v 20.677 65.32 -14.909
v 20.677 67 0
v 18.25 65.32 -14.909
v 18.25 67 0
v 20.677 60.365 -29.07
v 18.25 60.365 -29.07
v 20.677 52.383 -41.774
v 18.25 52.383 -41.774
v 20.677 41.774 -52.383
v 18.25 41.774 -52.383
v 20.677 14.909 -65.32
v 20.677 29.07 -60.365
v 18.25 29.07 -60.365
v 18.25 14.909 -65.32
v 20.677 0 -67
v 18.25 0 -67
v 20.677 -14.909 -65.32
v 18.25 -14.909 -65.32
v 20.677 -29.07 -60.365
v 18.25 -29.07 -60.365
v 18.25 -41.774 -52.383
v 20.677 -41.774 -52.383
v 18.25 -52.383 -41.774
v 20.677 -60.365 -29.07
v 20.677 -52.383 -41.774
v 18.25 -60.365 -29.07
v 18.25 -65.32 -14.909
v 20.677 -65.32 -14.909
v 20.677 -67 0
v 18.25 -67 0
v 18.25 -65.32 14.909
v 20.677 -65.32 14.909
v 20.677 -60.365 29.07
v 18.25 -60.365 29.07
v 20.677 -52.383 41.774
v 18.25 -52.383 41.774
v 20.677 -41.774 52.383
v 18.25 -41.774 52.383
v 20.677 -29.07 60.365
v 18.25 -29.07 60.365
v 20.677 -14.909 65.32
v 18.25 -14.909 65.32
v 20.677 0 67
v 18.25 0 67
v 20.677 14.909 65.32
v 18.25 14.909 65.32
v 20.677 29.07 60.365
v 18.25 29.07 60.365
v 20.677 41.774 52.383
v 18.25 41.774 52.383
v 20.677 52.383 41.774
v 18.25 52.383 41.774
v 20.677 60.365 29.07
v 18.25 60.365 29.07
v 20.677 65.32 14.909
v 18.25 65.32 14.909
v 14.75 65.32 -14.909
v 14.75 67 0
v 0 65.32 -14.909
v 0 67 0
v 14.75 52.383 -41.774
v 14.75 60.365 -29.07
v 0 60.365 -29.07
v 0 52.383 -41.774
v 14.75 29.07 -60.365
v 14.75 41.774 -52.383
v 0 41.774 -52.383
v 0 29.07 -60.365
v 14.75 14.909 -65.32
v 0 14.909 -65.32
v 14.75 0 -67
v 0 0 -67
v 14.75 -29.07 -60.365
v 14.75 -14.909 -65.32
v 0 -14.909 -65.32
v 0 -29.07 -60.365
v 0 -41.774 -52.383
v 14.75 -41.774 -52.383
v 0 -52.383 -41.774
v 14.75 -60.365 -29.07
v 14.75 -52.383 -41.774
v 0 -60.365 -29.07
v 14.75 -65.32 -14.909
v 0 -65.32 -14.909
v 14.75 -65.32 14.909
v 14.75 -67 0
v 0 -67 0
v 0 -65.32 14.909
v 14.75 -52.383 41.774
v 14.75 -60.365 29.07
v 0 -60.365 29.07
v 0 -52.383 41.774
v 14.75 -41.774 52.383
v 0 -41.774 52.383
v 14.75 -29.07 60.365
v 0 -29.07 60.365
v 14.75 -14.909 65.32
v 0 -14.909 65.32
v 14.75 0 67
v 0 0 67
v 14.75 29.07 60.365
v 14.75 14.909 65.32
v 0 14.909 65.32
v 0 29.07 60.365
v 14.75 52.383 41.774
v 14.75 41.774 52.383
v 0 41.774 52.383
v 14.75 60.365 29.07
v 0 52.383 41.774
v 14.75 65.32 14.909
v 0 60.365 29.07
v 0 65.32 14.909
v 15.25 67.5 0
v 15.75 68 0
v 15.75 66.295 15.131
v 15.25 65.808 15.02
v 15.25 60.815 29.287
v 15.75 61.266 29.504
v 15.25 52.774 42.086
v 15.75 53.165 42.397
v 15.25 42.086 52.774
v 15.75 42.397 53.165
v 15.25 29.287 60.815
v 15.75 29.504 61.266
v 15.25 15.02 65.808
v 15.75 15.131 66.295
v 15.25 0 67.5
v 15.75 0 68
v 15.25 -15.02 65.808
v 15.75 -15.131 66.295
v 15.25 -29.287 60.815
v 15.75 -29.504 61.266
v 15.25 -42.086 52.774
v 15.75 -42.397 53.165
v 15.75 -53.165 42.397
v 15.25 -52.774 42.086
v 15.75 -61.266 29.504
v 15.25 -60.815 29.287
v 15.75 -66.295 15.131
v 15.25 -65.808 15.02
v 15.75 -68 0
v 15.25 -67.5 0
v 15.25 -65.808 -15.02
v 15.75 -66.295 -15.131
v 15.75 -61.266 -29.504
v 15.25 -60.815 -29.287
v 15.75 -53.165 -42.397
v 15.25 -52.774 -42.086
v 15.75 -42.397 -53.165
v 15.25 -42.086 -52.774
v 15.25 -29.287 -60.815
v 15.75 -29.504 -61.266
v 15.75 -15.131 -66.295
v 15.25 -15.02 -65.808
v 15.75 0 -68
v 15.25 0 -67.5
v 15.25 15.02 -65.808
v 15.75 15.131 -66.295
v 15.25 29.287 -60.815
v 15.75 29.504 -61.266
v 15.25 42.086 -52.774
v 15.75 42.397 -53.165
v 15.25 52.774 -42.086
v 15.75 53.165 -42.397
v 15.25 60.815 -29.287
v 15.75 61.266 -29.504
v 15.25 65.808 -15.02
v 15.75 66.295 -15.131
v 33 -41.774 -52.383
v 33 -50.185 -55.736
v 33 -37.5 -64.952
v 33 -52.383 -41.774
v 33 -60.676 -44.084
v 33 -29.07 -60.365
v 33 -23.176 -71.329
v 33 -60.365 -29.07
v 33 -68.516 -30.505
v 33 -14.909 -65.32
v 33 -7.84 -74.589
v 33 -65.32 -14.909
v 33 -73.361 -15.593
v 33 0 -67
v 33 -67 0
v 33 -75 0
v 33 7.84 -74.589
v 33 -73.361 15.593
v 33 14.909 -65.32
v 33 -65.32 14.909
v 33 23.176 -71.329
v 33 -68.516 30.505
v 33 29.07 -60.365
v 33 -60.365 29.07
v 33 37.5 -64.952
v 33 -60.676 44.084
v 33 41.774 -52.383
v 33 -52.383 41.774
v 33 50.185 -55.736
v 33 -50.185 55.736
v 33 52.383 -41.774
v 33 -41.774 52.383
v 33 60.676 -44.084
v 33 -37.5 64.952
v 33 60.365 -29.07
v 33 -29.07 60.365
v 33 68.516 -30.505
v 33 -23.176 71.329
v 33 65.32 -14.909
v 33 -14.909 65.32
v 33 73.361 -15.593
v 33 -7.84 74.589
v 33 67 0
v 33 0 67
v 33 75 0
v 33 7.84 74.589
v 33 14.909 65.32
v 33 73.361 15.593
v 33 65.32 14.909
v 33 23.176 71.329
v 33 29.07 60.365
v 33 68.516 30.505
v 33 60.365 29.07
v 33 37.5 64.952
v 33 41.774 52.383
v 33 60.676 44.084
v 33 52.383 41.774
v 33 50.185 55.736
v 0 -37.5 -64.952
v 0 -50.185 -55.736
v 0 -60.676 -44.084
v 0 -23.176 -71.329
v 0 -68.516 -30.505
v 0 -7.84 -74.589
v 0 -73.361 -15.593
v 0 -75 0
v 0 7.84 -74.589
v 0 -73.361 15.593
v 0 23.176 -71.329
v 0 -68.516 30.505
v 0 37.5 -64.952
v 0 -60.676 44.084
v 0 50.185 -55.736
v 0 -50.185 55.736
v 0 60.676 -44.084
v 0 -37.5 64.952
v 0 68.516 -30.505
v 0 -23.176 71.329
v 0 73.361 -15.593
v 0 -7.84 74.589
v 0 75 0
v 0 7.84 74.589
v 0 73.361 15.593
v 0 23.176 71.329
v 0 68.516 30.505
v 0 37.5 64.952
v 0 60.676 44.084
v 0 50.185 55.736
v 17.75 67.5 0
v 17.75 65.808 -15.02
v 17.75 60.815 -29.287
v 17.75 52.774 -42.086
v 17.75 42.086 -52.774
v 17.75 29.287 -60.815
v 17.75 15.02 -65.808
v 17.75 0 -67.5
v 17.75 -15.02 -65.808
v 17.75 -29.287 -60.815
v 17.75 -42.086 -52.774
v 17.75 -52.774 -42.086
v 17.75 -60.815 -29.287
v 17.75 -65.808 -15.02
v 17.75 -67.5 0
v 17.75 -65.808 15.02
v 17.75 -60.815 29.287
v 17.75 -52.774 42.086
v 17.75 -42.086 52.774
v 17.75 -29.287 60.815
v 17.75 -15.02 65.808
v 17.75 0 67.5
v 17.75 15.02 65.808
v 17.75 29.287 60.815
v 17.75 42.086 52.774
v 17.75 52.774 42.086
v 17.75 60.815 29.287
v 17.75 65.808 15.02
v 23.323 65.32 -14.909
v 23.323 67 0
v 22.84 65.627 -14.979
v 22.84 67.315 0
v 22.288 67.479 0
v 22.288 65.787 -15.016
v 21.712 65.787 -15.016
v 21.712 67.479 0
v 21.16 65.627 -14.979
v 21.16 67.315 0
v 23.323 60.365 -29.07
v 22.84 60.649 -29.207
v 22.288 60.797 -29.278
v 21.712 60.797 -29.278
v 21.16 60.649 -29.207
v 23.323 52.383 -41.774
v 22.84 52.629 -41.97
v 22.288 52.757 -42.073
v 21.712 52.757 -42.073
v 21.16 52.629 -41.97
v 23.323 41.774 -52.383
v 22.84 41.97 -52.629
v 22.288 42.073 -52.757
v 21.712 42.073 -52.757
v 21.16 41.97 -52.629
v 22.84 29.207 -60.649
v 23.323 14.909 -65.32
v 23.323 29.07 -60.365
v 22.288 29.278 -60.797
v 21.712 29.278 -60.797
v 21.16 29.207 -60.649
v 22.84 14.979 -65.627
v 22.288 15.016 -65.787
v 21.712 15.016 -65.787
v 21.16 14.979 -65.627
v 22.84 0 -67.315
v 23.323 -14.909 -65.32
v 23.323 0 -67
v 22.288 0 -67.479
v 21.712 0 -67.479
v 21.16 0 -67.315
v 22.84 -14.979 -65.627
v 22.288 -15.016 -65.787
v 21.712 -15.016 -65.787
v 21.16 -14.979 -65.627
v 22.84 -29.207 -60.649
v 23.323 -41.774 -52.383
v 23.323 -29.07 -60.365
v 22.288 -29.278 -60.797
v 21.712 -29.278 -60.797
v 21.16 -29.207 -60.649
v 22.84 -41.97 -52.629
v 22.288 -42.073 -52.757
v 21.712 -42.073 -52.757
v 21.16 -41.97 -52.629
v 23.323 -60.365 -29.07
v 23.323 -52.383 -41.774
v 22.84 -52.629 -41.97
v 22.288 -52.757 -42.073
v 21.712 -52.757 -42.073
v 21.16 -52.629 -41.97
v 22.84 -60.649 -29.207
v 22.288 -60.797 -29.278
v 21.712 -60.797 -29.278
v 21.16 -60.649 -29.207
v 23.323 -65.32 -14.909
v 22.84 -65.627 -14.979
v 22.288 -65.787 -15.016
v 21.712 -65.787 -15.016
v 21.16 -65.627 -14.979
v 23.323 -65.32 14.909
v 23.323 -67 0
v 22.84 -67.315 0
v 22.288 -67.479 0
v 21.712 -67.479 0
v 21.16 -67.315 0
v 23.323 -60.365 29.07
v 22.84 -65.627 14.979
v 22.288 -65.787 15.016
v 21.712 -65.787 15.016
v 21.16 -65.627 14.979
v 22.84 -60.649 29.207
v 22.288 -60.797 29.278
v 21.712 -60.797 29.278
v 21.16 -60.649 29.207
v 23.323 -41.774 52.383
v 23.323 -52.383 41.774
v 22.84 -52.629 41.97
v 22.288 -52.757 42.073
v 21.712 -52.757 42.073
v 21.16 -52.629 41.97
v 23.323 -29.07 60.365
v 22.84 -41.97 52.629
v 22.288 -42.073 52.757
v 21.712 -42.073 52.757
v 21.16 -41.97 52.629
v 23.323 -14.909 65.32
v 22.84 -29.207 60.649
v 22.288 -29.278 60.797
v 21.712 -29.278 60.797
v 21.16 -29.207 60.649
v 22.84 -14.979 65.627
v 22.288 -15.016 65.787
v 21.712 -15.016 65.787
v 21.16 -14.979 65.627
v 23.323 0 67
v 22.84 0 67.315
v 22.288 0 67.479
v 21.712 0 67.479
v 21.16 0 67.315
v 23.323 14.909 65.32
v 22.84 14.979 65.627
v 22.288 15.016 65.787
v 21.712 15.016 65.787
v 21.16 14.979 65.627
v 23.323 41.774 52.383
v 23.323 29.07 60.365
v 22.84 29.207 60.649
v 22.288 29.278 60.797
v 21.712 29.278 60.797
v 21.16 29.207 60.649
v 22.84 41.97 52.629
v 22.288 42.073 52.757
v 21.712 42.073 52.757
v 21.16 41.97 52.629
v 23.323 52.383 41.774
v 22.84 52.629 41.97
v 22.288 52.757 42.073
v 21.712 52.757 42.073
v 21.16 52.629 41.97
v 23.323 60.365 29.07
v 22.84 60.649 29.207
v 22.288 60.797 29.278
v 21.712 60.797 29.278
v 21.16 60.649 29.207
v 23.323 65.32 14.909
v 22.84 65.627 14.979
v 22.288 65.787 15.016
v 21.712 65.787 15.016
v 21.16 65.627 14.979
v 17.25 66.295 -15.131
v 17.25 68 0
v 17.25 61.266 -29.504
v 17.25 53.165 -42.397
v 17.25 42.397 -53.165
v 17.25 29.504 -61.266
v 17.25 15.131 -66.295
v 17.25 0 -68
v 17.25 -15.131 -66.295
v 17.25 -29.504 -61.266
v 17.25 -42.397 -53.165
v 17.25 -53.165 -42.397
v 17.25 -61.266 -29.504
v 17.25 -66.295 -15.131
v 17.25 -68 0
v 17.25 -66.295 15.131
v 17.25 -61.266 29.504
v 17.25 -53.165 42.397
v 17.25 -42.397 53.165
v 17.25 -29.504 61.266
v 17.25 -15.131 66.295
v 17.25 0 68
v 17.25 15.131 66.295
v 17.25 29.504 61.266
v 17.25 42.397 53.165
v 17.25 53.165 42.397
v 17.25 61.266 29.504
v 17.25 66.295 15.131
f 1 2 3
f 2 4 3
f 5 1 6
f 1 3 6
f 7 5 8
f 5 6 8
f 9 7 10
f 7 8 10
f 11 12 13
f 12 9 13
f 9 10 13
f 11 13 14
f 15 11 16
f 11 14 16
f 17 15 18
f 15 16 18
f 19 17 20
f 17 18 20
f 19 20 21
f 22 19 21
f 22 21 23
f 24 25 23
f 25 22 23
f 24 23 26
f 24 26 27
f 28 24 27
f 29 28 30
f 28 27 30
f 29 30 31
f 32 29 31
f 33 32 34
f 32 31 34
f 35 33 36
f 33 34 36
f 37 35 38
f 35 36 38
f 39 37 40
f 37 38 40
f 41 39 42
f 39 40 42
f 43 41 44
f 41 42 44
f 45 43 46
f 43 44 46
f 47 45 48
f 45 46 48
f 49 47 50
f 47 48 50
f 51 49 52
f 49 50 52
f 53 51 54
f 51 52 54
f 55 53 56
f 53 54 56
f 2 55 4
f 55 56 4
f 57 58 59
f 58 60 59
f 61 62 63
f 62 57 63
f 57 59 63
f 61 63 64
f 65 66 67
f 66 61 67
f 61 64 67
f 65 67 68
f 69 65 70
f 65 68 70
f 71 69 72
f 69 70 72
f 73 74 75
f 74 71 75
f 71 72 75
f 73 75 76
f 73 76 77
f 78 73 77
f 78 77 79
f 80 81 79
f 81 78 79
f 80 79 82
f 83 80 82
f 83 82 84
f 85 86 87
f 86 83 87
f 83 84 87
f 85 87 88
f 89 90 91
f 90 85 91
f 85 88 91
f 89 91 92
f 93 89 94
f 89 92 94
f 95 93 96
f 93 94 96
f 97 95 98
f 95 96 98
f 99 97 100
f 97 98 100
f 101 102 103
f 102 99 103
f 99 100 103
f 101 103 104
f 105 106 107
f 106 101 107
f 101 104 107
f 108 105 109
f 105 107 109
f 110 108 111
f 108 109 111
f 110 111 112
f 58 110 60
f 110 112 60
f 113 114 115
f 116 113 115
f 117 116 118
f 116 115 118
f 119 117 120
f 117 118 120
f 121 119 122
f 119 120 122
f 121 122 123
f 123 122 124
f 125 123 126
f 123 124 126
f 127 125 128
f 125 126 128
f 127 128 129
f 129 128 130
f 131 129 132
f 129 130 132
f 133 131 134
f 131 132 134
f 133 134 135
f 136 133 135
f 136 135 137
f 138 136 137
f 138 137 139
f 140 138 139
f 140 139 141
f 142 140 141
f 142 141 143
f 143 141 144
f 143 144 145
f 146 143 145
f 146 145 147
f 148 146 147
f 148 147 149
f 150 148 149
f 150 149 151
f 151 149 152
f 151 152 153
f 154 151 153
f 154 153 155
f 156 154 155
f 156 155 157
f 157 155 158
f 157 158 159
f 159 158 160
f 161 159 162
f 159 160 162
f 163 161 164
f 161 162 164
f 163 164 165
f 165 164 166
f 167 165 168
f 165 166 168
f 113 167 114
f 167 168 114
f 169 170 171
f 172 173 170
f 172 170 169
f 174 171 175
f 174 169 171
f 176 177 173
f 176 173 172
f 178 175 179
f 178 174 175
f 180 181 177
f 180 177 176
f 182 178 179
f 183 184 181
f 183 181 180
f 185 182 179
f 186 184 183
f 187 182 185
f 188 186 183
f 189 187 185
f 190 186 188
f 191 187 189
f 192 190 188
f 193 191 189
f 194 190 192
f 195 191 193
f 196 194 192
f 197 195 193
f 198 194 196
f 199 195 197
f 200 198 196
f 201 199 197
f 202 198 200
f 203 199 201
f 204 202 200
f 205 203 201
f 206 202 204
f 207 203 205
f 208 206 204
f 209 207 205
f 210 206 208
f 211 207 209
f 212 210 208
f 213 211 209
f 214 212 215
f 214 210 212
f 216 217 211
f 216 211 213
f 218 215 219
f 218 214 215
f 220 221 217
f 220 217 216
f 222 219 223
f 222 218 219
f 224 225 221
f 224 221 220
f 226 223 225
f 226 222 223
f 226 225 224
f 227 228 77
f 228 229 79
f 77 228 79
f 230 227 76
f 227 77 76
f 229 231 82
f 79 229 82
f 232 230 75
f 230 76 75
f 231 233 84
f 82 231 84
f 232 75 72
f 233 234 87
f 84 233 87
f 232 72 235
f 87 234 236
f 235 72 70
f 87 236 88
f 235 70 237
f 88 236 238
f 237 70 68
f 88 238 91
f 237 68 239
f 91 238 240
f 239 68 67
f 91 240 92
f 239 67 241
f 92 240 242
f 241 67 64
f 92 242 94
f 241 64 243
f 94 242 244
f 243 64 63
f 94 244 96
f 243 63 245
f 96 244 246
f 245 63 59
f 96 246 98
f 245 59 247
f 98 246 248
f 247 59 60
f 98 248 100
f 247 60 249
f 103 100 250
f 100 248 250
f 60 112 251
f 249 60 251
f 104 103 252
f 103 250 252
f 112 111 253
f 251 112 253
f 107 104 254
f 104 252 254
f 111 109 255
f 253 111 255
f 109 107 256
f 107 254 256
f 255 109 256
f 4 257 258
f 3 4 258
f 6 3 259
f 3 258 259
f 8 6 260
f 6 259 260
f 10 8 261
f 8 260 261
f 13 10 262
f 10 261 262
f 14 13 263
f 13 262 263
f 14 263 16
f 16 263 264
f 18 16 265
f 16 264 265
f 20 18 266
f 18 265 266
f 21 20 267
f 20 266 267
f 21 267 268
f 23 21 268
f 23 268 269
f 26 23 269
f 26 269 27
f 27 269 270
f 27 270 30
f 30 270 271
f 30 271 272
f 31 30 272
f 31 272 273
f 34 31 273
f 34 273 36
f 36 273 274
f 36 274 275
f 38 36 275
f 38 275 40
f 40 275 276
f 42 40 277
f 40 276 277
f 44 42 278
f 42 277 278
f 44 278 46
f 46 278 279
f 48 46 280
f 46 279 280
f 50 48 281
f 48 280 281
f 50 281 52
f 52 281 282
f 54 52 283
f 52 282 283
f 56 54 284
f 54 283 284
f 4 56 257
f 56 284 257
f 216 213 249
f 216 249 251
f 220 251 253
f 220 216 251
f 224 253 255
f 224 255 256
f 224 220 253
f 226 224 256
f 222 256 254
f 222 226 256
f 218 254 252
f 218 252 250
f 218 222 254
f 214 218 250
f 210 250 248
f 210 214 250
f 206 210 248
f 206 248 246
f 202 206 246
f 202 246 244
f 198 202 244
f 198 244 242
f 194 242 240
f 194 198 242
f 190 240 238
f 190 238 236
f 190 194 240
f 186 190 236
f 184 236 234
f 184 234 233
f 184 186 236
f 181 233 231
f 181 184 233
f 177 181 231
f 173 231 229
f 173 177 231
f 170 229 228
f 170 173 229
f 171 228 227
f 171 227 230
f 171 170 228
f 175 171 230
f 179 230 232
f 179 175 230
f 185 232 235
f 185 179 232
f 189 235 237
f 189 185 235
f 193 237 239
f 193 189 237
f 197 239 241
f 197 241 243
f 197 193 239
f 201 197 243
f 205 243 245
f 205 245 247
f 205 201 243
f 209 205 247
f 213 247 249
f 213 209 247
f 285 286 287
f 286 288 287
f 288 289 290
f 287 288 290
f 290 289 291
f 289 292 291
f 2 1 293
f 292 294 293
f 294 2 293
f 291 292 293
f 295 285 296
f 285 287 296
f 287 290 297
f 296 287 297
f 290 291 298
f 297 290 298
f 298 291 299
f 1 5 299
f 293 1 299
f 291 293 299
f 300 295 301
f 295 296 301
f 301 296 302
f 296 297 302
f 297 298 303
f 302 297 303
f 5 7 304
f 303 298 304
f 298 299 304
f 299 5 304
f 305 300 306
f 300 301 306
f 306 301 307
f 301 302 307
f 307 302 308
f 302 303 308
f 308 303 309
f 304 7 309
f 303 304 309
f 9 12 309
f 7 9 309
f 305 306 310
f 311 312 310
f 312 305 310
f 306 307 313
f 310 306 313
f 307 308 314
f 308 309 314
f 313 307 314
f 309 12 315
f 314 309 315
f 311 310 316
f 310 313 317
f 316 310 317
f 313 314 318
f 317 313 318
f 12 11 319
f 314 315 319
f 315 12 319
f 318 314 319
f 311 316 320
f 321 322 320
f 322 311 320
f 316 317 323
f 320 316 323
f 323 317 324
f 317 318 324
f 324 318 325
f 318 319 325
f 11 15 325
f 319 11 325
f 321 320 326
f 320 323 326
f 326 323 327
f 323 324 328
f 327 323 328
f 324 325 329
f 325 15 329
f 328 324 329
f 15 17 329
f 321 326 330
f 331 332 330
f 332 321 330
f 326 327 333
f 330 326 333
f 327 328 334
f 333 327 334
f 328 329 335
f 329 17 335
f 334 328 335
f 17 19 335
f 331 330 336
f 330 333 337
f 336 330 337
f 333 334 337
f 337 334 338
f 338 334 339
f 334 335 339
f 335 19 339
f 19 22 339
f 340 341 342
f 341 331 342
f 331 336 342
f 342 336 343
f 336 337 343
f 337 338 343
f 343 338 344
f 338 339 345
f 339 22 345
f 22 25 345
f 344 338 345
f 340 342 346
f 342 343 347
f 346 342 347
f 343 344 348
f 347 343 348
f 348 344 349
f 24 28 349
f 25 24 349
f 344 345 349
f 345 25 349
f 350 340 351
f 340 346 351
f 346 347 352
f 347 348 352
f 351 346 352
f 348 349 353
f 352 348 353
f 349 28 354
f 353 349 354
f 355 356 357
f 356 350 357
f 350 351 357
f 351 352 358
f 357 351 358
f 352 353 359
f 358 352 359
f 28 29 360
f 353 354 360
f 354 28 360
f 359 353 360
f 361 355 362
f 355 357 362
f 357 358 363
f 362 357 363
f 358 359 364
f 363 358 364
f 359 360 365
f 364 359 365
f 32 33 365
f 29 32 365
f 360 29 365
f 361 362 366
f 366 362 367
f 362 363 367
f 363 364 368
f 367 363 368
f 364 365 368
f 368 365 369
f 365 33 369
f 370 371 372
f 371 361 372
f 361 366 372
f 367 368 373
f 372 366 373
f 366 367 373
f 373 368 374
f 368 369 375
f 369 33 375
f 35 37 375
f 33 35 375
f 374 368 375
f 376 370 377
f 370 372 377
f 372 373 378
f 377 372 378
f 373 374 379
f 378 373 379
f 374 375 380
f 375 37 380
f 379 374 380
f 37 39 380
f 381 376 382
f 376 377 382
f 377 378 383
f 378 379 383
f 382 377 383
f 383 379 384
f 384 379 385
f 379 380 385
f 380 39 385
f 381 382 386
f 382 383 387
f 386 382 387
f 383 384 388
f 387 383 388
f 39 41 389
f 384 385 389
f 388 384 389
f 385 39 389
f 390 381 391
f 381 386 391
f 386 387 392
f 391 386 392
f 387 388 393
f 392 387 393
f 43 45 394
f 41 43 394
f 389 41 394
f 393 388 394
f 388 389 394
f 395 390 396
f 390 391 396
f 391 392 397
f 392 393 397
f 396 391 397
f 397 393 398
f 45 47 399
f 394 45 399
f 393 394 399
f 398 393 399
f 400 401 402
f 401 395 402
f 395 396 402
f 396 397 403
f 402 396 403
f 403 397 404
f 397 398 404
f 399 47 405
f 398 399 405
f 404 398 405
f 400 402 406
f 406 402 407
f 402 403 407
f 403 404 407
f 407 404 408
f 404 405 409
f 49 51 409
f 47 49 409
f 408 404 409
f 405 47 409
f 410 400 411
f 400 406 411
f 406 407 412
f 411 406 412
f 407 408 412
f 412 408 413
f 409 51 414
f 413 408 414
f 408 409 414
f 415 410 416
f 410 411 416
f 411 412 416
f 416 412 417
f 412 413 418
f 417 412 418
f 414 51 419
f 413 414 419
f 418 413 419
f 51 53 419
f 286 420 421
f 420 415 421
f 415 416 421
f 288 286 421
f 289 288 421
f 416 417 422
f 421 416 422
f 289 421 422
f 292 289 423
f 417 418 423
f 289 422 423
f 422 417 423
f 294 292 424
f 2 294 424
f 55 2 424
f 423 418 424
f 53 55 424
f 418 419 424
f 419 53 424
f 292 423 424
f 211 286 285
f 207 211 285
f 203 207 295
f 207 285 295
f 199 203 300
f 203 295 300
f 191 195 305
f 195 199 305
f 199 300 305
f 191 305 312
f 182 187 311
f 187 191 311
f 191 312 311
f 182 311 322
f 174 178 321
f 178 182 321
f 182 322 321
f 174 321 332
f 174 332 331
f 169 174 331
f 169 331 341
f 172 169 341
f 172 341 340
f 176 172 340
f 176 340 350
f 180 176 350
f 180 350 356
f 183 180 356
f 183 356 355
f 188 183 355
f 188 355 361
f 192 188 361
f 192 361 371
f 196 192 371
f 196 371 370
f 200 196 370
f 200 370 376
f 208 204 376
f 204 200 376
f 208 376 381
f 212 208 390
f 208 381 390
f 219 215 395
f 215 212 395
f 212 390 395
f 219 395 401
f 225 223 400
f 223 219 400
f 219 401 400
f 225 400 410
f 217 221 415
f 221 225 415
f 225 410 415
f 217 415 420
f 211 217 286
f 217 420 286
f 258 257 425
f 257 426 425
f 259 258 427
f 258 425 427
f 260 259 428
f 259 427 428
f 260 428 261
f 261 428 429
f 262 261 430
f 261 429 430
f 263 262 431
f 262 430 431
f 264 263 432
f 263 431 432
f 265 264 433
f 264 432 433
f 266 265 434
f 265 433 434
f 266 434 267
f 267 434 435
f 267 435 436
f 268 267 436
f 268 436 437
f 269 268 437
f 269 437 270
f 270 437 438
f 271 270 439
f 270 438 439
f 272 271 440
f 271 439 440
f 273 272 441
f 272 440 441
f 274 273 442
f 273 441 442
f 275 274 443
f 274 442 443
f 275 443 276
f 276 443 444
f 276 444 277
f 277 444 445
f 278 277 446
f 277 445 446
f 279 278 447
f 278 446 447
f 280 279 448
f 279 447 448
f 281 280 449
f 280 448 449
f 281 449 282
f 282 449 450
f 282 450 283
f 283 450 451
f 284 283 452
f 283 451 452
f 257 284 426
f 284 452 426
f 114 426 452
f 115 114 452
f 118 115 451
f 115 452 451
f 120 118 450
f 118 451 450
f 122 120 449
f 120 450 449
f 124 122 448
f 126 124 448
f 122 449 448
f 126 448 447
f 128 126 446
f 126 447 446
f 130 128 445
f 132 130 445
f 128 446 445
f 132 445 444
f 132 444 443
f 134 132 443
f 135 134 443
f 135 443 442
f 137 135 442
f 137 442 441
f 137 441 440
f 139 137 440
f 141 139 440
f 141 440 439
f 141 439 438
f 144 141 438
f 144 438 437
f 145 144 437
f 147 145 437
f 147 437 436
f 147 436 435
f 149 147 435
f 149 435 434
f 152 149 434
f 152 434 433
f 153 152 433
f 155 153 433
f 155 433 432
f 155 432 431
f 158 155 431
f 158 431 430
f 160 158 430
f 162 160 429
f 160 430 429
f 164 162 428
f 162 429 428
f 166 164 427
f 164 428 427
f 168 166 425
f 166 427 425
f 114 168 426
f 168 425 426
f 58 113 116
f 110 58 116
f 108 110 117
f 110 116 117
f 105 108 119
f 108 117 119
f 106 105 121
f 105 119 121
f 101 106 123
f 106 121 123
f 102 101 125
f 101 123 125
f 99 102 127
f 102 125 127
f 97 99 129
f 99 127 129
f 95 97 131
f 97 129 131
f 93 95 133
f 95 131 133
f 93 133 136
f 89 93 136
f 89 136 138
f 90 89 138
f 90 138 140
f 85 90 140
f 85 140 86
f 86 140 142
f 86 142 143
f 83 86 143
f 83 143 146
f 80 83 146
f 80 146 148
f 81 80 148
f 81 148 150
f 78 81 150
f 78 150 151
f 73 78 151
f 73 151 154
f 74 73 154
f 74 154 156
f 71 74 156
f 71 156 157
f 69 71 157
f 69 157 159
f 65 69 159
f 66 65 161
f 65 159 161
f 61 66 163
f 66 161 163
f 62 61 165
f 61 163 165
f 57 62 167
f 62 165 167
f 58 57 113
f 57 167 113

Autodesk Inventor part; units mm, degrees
ref_plane "YZ Plane" through (0, 0, 0) normal (1, 0, 0) x (0, 1, 0)
ref_plane "XZ Plane" through (0, 0, 0) normal (0, 1, 0) x (-1, 0, 0)
ref_plane "XY Plane" through (0, 0, 0) normal (0, 0, 1) x (1, 0, 0)
sketch "Sketch1" plane through (0, 0, 0) normal (0, 0, 1) x (1, 0, 0)
  line L0 (0, 75) -> (33, 75)
  line L1 (33, 75) -> (33, 67)
  line L2 (33, 67) -> (0, 67)
  line L3 (0, 67) -> (0, 75)
  line L4 (14.75, 67) -> (15.75, 68)
  line L5 (15.75, 68) -> (17.25, 68)
  line L6 (17.25, 68) -> (18.25, 67)
  line L7 (15.25, 67.5) -> (17.75, 67.5)
  line L8 (17.75, 67.5) -> (17.75, 67)
  line L9 (17.75, 67) -> (15.25, 67)
  line L10 (15.25, 67) -> (15.25, 67.5)
  circle A0 centre (22, 65.5) radius 2
  line L11 (0, -15) -> (0, 90) projected
  line L12 (-6.6, 0) -> (39.6, 0) projected
  point P0 (0, 0)
  point P1 (20, 65.5)
  point P2 (16.5, 68)
  point P3 (16.5, 67)
  point P4 (20.6771, 67)
  point P5 (23.3229, 67)
  dimension "d7" = 4
  dimension "d0" = 2.5
  dimension "d1" = 67.5
  dimension "d2" = 0.5
  dimension "d3" = 75
  dimension "d4" = 1
  dimension "d5" = 33
  dimension "d8" = 1.75
  dimension "d10" = 67
revolve "Revolution1" add sketch "Sketch1" angle 360 about axis through (-10, 0, 0) along (1, 0, 0) contours L0 L1 L2 A0 L6 L5 L4 L3
properties part number "One Piece Ring" material "UHMW, Black"
